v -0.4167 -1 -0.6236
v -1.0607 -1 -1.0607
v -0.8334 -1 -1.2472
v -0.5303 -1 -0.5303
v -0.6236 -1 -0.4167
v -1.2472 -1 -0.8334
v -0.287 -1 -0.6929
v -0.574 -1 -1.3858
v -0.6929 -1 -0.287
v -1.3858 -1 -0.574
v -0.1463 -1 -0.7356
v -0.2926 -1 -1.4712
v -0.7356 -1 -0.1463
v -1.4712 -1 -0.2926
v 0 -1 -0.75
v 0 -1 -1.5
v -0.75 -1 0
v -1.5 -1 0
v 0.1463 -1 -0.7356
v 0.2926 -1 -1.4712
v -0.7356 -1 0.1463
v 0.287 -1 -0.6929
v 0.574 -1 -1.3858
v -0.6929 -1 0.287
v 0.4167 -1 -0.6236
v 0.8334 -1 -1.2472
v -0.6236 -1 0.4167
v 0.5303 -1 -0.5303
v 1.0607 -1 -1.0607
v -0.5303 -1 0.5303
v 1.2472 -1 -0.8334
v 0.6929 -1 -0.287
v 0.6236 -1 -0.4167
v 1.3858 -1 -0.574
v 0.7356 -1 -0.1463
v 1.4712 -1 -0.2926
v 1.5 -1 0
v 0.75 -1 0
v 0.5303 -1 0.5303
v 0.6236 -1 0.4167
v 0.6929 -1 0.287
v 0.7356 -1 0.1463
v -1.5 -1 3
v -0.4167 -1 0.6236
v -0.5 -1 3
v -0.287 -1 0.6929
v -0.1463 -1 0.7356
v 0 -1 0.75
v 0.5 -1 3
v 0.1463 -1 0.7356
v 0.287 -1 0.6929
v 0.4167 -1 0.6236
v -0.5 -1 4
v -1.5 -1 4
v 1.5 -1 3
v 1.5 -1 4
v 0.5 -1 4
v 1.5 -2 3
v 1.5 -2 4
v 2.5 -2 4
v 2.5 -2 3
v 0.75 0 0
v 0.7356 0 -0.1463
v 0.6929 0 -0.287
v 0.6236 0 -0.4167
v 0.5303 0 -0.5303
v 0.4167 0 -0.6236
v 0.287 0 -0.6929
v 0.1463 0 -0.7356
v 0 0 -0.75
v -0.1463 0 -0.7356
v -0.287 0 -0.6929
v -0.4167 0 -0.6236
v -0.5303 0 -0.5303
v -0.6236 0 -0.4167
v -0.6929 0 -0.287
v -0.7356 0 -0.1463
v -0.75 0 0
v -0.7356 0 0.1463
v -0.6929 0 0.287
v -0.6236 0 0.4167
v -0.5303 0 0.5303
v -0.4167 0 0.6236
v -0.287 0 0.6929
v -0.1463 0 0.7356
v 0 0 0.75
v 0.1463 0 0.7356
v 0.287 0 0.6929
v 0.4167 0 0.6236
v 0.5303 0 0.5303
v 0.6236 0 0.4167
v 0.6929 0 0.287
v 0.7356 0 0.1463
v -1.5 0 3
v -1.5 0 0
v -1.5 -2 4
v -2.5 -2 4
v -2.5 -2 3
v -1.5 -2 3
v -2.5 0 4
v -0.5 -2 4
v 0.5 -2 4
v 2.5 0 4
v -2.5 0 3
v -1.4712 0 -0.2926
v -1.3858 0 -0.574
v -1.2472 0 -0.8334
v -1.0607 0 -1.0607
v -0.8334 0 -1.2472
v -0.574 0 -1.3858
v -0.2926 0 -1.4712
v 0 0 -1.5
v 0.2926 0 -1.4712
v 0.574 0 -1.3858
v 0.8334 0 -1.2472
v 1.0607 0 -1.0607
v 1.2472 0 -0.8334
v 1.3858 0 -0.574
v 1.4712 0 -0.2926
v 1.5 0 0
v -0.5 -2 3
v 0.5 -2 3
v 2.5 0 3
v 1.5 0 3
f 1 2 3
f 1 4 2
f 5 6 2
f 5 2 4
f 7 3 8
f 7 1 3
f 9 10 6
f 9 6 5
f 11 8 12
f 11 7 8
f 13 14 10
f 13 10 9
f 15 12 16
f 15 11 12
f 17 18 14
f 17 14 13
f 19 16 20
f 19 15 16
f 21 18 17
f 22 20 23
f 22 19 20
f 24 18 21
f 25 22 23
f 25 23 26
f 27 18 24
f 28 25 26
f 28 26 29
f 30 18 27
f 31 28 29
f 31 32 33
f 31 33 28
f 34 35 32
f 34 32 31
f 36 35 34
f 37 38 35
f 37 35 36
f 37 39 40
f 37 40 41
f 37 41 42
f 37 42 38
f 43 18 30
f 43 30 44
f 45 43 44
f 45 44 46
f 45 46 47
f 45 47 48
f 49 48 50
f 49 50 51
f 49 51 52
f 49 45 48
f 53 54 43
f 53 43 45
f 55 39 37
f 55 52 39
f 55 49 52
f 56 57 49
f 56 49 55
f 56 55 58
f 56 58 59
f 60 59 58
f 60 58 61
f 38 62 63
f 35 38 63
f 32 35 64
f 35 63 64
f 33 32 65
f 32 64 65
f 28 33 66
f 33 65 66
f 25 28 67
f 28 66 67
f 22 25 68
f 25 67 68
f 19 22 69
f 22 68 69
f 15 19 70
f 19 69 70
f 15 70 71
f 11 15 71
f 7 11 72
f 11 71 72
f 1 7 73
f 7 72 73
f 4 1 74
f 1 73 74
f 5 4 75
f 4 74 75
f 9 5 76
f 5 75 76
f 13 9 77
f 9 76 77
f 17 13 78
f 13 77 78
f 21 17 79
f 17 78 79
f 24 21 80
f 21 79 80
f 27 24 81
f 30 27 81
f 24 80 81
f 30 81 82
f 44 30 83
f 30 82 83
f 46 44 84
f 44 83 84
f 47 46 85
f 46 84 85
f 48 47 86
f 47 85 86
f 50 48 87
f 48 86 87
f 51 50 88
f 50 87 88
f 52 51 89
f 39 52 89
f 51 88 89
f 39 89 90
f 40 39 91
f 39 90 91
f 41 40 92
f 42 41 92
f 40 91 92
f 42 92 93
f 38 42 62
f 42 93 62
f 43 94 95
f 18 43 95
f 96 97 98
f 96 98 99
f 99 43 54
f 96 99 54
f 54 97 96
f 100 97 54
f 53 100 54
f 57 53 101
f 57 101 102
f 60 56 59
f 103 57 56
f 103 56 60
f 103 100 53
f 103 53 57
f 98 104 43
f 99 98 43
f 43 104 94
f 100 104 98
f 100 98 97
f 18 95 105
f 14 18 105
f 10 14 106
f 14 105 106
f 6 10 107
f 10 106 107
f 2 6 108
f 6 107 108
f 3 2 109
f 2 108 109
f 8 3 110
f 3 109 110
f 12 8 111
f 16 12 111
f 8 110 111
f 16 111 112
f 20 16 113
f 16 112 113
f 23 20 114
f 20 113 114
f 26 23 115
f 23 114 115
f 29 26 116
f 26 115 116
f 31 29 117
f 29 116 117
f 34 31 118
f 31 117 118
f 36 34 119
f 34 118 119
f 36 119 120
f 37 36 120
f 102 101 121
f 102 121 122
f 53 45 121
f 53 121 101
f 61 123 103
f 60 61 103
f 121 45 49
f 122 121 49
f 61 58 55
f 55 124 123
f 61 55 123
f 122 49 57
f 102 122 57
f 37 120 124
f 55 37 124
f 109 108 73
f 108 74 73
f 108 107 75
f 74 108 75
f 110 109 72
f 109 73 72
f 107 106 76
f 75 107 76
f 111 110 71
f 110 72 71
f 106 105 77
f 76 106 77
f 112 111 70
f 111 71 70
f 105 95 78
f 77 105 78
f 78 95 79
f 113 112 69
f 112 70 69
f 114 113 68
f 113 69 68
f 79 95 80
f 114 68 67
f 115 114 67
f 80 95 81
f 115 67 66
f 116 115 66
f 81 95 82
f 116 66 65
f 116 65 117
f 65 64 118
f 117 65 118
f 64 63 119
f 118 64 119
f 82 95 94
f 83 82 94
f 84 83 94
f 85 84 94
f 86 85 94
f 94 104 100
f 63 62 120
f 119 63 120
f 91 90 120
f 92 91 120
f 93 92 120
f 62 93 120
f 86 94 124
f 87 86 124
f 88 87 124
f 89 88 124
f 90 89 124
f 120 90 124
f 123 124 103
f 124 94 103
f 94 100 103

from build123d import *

# Parameters (mm, degrees)
F0_W     = 1
F0_H     = 1
F1_DEPTH = 2
F2_DEPTH = 1


with BuildPart() as f1:
    # F0 (on Front) → F1 (new body)
    with BuildSketch(Plane.XZ):
        with Locations((-2, 3.5)):
            Rectangle(F0_W, F0_H)
    extrude(amount=F1_DEPTH)



with BuildPart() as f1b:
    # F0 (on Front) → F1, piece 2 (new body)
    with BuildSketch(Plane.XZ):
        with Locations((0, 3.5)):
            Rectangle(F0_W, F0_H)
    extrude(amount=F1_DEPTH)


with BuildPart() as f1c:
    # F0 (on Front) → F1, piece 3 (new body)
    with BuildSketch(Plane.XZ):
        with Locations((2, 3.5)):
            Rectangle(F0_W, F0_H)
    extrude(amount=F1_DEPTH)


with BuildPart() as f1_1:
    add(f1.part)

    add(f1b.part)  # F2 merges F1b

    add(f1c.part)  # F2 merges F1c
    # F0 (on Front) → F2 (join)
    with BuildSketch(Plane.XZ):
        with Locations((-1, 3.5)):
            Rectangle(F0_W, F0_H)
        with Locations((1, 3.5)):
            Rectangle(F0_W, F0_H)
        with BuildLine():
            ThreePointArc((-1.5, 0), (0, 1.5), (1.5, 0))
            Line((1.5, 0), (1.5, 3))
            Line((1.5, 3), (0.5, 3))
            Line((0.5, 3), (-0.5, 3))
            Line((-0.5, 3), (-1.5, 3))
            Line((-1.5, 3), (-1.5, 0))
        make_face()
        with BuildLine():
            Line((1.5, 0), (0.75, 0))
            ThreePointArc((0.75, 0), (0, -0.75), (-0.75, 0))
            Line((-0.75, 0), (-1.5, 0))
            ThreePointArc((-1.5, 0), (0, -1.5), (1.5, 0))
        make_face()
        with BuildLine():
            ThreePointArc((-0.75, 0), (0, 0.75), (0.75, 0))
            Line((0.75, 0), (1.5, 0))
            ThreePointArc((1.5, 0), (0, 1.5), (-1.5, 0))
            Line((-1.5, 0), (-0.75, 0))
        make_face()
    extrude(amount=F2_DEPTH)


solid = f1_1.part
